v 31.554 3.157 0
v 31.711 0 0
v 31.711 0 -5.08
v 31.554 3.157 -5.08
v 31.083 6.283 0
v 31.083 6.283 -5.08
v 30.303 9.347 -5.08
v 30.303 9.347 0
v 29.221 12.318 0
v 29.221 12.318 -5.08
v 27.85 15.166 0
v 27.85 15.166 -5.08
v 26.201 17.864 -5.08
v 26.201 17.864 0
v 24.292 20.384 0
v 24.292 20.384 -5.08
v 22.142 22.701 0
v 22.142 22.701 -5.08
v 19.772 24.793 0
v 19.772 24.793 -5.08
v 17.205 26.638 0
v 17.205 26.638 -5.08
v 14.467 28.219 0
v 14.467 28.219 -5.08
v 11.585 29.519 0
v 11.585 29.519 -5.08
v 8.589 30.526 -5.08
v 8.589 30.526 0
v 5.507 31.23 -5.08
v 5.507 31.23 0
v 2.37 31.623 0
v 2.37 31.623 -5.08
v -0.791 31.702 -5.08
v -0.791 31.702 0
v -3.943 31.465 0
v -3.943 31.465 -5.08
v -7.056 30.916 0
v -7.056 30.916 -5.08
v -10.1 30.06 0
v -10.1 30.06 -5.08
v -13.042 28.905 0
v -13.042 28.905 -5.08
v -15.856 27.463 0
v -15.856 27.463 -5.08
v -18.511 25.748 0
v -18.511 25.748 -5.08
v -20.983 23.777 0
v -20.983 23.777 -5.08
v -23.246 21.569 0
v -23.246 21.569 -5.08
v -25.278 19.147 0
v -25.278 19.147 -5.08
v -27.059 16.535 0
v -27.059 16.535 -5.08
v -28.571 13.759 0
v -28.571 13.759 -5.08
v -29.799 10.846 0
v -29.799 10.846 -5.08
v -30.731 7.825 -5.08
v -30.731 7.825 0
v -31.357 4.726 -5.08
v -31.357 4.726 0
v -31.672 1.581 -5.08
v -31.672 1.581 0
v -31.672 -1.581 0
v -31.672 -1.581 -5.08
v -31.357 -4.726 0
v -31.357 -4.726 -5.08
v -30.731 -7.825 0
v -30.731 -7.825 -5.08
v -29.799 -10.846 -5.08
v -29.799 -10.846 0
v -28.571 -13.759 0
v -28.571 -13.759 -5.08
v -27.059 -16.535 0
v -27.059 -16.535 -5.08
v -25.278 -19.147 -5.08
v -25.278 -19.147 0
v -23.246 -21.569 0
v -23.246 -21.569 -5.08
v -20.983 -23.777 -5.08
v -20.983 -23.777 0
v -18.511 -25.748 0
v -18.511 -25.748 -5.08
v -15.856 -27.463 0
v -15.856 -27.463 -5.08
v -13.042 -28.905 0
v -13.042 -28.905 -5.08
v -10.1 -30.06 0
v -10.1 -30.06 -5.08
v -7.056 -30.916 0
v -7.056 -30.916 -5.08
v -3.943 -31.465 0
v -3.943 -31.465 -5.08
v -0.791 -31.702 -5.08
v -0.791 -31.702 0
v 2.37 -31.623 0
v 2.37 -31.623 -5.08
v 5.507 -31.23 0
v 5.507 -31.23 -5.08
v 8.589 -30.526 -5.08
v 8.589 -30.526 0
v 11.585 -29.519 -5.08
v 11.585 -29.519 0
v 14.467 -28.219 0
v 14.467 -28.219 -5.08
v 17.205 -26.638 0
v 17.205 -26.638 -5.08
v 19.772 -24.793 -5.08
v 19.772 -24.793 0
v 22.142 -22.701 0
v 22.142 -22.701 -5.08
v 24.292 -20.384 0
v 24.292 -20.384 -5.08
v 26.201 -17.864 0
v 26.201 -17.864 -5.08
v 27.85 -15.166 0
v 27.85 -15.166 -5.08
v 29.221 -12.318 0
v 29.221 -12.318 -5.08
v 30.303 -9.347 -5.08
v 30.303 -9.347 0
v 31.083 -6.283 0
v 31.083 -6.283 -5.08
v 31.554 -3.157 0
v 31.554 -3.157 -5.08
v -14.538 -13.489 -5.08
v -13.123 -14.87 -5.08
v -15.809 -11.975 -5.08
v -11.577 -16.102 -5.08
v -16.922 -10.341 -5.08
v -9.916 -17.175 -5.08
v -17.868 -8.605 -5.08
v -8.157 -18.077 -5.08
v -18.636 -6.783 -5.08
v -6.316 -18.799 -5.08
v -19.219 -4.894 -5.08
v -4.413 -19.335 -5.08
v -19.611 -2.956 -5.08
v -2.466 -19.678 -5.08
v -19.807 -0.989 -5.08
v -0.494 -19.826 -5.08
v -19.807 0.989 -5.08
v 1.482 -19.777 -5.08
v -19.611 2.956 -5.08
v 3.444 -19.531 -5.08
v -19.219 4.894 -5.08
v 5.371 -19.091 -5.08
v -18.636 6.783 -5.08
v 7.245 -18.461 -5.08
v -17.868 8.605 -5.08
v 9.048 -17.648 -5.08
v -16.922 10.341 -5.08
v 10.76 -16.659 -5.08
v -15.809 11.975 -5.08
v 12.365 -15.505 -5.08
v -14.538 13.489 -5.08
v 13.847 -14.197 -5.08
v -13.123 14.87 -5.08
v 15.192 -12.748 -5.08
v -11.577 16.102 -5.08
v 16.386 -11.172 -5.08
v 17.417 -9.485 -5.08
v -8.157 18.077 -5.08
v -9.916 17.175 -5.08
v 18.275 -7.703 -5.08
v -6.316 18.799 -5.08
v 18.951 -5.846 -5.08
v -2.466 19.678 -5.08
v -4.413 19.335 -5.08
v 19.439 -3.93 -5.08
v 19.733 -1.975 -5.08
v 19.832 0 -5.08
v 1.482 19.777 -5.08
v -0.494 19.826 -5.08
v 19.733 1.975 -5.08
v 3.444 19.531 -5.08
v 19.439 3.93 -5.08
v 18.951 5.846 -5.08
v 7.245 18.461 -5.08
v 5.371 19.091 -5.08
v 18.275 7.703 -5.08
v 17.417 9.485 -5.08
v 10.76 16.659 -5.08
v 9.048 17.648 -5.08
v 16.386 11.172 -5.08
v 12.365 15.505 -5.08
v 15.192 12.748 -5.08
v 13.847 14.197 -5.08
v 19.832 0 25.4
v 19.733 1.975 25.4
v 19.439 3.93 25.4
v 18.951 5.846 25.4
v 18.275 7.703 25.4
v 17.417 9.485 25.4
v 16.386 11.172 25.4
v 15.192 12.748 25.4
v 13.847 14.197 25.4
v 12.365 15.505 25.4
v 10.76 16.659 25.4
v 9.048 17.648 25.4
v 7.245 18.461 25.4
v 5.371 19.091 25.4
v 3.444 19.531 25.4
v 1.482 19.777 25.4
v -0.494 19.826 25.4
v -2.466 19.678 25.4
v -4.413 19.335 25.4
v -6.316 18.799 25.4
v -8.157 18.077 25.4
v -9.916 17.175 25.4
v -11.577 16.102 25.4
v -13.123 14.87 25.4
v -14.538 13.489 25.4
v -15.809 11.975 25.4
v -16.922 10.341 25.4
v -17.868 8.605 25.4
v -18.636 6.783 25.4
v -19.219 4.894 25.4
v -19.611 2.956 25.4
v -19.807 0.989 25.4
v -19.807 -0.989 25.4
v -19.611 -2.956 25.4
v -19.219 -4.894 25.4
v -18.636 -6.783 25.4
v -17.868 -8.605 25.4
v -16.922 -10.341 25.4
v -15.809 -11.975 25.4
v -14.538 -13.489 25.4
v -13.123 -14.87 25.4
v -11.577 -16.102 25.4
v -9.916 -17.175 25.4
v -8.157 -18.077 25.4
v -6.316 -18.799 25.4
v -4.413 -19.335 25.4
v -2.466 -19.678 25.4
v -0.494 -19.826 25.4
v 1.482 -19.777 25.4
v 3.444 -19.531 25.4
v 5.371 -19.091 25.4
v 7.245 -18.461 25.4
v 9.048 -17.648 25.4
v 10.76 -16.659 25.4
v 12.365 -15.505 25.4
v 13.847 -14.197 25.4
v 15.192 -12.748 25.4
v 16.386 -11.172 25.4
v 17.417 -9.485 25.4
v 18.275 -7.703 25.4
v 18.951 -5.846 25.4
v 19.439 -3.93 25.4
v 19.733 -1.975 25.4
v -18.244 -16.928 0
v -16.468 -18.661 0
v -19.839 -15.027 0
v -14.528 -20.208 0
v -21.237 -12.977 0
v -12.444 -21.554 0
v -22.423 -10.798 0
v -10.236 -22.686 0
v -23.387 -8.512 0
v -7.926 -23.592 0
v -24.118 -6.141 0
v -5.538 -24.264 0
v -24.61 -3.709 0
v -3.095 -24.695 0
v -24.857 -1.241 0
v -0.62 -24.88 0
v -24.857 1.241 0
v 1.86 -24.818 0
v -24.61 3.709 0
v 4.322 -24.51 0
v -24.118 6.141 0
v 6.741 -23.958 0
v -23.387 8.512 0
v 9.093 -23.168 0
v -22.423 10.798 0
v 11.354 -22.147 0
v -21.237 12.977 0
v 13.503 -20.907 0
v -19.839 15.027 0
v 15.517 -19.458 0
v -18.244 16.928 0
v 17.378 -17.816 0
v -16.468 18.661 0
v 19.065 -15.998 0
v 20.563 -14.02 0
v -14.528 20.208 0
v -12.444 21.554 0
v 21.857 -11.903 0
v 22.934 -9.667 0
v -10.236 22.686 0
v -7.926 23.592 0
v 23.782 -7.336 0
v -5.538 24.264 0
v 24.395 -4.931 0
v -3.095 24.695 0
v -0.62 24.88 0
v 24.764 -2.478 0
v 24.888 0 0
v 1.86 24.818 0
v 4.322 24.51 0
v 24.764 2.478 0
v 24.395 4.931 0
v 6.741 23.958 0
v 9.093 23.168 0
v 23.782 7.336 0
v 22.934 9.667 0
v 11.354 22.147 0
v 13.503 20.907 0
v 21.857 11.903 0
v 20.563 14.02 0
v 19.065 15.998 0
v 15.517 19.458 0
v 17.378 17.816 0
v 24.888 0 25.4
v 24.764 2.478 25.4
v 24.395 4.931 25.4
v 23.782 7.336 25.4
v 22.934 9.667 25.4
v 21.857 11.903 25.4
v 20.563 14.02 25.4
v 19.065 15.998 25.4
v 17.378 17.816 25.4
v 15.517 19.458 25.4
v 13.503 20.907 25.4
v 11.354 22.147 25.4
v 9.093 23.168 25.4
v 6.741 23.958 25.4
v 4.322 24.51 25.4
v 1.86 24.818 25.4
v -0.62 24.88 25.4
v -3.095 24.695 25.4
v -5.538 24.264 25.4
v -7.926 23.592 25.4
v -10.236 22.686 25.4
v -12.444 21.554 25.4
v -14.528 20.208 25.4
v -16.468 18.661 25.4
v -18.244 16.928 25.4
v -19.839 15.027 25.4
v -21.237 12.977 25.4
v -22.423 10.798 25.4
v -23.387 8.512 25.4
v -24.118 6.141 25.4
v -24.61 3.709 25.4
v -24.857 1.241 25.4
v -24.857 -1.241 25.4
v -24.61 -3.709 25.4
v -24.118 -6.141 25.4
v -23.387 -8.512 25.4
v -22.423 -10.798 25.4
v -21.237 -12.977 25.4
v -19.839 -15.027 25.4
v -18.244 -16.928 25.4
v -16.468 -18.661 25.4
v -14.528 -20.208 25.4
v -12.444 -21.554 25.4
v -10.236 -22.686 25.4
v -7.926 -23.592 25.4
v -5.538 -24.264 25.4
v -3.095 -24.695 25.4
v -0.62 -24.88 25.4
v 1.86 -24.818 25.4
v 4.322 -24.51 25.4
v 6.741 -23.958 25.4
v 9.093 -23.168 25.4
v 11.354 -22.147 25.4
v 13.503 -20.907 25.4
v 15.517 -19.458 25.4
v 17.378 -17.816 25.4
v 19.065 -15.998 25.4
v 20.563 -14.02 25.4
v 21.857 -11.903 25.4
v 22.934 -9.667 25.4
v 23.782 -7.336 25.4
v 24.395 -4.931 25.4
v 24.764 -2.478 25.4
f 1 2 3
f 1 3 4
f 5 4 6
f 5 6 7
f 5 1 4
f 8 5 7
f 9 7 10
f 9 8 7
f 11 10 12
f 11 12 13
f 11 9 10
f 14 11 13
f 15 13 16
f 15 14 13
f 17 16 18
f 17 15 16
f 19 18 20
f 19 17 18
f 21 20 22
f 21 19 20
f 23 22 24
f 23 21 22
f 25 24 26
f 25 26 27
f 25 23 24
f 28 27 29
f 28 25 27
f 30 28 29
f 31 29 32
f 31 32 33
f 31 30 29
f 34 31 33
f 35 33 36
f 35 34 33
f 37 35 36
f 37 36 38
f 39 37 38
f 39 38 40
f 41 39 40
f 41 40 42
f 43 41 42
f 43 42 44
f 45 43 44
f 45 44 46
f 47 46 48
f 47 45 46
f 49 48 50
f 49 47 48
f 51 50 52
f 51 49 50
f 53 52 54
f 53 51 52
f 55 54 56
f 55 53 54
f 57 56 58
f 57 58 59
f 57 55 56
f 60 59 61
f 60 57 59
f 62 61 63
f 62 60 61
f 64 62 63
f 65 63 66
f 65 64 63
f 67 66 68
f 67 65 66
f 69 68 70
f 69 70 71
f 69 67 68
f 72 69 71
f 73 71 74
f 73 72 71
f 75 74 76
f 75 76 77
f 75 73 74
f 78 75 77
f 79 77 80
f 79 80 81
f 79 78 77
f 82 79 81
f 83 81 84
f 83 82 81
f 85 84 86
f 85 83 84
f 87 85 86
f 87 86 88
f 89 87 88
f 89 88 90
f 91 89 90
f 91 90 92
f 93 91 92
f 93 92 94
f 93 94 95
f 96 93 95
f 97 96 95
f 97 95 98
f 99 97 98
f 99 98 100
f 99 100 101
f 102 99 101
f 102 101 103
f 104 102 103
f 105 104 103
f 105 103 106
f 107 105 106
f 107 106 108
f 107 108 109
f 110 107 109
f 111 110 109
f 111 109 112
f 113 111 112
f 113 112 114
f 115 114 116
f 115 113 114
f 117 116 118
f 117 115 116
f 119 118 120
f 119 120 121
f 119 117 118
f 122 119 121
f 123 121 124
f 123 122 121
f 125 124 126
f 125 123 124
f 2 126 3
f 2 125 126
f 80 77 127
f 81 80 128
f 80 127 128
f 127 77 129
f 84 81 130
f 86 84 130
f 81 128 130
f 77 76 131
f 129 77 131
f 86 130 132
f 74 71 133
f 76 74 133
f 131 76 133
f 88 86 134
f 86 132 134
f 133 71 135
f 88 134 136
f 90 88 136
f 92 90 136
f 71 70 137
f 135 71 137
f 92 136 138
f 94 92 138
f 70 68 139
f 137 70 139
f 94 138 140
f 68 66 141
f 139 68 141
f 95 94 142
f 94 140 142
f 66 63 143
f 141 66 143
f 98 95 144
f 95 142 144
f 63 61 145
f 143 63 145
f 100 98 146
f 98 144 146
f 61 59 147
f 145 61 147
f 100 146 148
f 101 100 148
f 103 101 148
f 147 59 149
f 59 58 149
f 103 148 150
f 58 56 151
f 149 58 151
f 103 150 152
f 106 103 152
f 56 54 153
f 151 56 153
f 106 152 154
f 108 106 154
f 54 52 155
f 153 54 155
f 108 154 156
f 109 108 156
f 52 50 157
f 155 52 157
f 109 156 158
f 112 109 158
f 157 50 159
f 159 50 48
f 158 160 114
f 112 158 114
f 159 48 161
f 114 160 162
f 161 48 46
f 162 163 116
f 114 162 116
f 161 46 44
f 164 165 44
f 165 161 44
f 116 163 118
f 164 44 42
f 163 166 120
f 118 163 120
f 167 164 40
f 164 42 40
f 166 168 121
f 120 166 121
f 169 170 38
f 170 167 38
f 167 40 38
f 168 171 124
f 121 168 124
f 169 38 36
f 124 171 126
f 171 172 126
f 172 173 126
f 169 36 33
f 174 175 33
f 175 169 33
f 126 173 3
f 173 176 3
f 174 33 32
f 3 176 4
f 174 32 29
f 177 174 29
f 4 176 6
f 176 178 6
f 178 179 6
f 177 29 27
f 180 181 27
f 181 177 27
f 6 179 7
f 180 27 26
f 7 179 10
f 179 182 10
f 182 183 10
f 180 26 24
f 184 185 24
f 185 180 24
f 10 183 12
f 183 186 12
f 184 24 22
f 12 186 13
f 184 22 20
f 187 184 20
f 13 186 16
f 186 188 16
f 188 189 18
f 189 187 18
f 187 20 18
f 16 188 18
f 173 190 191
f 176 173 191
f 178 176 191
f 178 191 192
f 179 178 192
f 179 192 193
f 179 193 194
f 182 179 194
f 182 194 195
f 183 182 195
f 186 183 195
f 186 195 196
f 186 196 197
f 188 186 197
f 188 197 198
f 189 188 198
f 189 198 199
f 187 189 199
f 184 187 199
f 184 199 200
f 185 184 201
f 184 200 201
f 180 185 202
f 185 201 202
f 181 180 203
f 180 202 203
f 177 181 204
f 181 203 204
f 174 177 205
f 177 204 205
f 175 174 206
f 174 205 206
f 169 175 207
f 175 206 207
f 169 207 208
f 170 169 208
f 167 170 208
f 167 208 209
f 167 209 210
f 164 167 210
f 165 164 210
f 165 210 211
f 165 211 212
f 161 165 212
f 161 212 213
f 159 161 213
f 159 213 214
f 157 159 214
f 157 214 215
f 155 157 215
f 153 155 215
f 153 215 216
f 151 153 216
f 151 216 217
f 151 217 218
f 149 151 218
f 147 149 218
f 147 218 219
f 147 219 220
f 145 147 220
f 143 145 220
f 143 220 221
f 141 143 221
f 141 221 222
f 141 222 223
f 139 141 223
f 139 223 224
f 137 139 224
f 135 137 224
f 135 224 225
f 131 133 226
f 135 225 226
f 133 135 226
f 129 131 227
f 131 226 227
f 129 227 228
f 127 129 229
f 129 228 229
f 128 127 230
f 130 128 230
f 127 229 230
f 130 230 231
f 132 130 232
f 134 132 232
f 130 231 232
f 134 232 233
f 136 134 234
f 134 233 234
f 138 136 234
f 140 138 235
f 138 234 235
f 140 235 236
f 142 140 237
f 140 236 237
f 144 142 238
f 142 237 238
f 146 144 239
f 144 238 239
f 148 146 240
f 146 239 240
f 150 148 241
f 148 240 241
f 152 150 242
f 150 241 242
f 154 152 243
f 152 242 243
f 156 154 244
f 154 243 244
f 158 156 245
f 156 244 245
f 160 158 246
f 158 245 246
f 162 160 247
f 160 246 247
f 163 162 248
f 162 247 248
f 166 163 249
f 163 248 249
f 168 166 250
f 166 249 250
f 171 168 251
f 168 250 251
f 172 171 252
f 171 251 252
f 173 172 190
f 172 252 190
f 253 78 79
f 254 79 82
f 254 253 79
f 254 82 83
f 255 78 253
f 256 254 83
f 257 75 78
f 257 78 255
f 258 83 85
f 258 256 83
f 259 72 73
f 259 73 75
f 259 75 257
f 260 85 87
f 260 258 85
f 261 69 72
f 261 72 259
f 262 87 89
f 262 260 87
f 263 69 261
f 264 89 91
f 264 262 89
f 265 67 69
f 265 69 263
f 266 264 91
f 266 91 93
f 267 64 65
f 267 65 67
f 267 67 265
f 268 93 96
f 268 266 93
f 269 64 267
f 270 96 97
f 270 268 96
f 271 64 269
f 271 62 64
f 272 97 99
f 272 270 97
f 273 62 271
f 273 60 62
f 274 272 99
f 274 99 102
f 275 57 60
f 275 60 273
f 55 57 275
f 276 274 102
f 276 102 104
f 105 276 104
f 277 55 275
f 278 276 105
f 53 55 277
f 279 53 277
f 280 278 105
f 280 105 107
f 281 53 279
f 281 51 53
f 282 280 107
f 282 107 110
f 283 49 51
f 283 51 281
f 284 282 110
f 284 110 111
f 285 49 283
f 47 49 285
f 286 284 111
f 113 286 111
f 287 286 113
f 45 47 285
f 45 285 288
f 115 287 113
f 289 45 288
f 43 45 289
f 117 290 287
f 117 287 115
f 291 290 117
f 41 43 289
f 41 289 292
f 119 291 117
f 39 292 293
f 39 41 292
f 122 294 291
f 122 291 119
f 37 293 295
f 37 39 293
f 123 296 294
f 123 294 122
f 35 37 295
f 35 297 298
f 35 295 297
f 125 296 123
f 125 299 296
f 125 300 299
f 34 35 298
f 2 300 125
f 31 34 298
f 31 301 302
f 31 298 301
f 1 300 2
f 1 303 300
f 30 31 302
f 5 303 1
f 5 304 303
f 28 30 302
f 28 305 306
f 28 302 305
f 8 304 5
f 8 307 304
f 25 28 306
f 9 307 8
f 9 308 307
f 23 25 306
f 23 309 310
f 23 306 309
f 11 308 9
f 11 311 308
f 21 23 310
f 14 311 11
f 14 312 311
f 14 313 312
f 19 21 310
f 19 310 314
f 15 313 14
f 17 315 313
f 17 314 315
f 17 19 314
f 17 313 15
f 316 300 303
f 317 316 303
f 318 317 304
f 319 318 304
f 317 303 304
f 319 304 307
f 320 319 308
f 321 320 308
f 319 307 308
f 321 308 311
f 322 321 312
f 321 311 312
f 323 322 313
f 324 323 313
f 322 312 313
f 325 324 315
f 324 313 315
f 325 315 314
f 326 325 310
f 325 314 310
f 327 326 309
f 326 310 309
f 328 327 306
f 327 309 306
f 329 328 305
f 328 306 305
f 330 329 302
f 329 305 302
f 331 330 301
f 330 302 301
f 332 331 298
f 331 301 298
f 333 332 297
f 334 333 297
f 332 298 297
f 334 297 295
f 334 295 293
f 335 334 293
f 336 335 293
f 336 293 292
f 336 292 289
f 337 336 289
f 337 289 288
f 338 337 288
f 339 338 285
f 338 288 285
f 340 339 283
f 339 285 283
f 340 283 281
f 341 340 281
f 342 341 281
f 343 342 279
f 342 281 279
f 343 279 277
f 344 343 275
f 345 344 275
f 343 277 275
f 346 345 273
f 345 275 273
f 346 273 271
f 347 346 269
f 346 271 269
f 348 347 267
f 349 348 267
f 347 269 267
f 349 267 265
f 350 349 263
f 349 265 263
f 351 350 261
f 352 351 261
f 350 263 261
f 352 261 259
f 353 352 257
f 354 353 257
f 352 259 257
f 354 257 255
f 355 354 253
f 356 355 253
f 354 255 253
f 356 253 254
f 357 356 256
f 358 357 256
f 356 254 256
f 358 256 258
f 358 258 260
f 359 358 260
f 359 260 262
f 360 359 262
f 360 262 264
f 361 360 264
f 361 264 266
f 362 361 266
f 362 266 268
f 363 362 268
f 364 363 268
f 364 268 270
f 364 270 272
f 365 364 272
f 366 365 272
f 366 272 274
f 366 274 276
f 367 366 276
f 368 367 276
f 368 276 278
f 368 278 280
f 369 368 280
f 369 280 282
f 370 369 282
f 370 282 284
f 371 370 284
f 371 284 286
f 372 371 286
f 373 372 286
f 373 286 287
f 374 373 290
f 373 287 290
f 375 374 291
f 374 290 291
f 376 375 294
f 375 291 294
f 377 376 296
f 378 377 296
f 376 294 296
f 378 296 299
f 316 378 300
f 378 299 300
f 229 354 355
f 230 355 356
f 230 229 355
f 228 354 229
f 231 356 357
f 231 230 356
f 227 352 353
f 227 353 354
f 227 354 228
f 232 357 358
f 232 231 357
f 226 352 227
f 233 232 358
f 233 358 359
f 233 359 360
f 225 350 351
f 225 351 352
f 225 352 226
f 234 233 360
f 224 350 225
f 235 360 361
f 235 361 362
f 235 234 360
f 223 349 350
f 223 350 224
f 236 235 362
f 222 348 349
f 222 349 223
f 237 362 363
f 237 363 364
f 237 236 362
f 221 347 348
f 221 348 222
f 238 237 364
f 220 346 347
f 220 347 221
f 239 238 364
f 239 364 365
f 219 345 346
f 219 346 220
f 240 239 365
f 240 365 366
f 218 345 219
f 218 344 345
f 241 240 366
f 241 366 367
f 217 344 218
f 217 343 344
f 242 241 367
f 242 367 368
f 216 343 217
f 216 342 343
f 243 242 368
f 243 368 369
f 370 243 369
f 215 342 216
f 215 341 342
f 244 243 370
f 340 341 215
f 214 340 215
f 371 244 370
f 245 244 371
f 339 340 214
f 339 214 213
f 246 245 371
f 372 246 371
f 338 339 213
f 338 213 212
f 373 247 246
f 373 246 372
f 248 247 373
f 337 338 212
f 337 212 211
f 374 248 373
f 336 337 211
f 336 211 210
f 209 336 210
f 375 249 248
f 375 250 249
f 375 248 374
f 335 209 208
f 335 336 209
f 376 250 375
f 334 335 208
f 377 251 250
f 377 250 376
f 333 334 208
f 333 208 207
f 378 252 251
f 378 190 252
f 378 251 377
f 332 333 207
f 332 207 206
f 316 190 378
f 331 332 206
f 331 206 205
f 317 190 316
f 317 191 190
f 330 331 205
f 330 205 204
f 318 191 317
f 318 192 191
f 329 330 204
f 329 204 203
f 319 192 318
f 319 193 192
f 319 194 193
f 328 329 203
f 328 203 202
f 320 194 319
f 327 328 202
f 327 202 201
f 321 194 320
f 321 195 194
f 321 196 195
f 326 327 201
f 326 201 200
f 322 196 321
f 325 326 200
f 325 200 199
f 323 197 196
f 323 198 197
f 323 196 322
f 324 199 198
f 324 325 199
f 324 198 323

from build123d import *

# Parameters (mm, degrees)
F0_R     = 24.887992
F1_DEPTH = 25.4
F2_R     = 31.71137
F3_DEPTH = 5.08
F4_R     = 19.832009
F5_DEPTH = 38.1


with BuildPart() as f1:
    # F0 (on Top) → F1 (new body)
    with BuildSketch(Plane.XY):
        Circle(F0_R)
    extrude(amount=F1_DEPTH)

    # F2 (on Top) → F3 (join)
    with BuildSketch(Plane.XY):
        Circle(F2_R)
    extrude(amount=-F3_DEPTH)

    # F4 (on face) → F5 (cut)
    with BuildSketch(Plane.XY.offset(25.4)):
        Circle(F4_R)
    extrude(amount=-F5_DEPTH, mode=Mode.SUBTRACT)


solid = f1.part
